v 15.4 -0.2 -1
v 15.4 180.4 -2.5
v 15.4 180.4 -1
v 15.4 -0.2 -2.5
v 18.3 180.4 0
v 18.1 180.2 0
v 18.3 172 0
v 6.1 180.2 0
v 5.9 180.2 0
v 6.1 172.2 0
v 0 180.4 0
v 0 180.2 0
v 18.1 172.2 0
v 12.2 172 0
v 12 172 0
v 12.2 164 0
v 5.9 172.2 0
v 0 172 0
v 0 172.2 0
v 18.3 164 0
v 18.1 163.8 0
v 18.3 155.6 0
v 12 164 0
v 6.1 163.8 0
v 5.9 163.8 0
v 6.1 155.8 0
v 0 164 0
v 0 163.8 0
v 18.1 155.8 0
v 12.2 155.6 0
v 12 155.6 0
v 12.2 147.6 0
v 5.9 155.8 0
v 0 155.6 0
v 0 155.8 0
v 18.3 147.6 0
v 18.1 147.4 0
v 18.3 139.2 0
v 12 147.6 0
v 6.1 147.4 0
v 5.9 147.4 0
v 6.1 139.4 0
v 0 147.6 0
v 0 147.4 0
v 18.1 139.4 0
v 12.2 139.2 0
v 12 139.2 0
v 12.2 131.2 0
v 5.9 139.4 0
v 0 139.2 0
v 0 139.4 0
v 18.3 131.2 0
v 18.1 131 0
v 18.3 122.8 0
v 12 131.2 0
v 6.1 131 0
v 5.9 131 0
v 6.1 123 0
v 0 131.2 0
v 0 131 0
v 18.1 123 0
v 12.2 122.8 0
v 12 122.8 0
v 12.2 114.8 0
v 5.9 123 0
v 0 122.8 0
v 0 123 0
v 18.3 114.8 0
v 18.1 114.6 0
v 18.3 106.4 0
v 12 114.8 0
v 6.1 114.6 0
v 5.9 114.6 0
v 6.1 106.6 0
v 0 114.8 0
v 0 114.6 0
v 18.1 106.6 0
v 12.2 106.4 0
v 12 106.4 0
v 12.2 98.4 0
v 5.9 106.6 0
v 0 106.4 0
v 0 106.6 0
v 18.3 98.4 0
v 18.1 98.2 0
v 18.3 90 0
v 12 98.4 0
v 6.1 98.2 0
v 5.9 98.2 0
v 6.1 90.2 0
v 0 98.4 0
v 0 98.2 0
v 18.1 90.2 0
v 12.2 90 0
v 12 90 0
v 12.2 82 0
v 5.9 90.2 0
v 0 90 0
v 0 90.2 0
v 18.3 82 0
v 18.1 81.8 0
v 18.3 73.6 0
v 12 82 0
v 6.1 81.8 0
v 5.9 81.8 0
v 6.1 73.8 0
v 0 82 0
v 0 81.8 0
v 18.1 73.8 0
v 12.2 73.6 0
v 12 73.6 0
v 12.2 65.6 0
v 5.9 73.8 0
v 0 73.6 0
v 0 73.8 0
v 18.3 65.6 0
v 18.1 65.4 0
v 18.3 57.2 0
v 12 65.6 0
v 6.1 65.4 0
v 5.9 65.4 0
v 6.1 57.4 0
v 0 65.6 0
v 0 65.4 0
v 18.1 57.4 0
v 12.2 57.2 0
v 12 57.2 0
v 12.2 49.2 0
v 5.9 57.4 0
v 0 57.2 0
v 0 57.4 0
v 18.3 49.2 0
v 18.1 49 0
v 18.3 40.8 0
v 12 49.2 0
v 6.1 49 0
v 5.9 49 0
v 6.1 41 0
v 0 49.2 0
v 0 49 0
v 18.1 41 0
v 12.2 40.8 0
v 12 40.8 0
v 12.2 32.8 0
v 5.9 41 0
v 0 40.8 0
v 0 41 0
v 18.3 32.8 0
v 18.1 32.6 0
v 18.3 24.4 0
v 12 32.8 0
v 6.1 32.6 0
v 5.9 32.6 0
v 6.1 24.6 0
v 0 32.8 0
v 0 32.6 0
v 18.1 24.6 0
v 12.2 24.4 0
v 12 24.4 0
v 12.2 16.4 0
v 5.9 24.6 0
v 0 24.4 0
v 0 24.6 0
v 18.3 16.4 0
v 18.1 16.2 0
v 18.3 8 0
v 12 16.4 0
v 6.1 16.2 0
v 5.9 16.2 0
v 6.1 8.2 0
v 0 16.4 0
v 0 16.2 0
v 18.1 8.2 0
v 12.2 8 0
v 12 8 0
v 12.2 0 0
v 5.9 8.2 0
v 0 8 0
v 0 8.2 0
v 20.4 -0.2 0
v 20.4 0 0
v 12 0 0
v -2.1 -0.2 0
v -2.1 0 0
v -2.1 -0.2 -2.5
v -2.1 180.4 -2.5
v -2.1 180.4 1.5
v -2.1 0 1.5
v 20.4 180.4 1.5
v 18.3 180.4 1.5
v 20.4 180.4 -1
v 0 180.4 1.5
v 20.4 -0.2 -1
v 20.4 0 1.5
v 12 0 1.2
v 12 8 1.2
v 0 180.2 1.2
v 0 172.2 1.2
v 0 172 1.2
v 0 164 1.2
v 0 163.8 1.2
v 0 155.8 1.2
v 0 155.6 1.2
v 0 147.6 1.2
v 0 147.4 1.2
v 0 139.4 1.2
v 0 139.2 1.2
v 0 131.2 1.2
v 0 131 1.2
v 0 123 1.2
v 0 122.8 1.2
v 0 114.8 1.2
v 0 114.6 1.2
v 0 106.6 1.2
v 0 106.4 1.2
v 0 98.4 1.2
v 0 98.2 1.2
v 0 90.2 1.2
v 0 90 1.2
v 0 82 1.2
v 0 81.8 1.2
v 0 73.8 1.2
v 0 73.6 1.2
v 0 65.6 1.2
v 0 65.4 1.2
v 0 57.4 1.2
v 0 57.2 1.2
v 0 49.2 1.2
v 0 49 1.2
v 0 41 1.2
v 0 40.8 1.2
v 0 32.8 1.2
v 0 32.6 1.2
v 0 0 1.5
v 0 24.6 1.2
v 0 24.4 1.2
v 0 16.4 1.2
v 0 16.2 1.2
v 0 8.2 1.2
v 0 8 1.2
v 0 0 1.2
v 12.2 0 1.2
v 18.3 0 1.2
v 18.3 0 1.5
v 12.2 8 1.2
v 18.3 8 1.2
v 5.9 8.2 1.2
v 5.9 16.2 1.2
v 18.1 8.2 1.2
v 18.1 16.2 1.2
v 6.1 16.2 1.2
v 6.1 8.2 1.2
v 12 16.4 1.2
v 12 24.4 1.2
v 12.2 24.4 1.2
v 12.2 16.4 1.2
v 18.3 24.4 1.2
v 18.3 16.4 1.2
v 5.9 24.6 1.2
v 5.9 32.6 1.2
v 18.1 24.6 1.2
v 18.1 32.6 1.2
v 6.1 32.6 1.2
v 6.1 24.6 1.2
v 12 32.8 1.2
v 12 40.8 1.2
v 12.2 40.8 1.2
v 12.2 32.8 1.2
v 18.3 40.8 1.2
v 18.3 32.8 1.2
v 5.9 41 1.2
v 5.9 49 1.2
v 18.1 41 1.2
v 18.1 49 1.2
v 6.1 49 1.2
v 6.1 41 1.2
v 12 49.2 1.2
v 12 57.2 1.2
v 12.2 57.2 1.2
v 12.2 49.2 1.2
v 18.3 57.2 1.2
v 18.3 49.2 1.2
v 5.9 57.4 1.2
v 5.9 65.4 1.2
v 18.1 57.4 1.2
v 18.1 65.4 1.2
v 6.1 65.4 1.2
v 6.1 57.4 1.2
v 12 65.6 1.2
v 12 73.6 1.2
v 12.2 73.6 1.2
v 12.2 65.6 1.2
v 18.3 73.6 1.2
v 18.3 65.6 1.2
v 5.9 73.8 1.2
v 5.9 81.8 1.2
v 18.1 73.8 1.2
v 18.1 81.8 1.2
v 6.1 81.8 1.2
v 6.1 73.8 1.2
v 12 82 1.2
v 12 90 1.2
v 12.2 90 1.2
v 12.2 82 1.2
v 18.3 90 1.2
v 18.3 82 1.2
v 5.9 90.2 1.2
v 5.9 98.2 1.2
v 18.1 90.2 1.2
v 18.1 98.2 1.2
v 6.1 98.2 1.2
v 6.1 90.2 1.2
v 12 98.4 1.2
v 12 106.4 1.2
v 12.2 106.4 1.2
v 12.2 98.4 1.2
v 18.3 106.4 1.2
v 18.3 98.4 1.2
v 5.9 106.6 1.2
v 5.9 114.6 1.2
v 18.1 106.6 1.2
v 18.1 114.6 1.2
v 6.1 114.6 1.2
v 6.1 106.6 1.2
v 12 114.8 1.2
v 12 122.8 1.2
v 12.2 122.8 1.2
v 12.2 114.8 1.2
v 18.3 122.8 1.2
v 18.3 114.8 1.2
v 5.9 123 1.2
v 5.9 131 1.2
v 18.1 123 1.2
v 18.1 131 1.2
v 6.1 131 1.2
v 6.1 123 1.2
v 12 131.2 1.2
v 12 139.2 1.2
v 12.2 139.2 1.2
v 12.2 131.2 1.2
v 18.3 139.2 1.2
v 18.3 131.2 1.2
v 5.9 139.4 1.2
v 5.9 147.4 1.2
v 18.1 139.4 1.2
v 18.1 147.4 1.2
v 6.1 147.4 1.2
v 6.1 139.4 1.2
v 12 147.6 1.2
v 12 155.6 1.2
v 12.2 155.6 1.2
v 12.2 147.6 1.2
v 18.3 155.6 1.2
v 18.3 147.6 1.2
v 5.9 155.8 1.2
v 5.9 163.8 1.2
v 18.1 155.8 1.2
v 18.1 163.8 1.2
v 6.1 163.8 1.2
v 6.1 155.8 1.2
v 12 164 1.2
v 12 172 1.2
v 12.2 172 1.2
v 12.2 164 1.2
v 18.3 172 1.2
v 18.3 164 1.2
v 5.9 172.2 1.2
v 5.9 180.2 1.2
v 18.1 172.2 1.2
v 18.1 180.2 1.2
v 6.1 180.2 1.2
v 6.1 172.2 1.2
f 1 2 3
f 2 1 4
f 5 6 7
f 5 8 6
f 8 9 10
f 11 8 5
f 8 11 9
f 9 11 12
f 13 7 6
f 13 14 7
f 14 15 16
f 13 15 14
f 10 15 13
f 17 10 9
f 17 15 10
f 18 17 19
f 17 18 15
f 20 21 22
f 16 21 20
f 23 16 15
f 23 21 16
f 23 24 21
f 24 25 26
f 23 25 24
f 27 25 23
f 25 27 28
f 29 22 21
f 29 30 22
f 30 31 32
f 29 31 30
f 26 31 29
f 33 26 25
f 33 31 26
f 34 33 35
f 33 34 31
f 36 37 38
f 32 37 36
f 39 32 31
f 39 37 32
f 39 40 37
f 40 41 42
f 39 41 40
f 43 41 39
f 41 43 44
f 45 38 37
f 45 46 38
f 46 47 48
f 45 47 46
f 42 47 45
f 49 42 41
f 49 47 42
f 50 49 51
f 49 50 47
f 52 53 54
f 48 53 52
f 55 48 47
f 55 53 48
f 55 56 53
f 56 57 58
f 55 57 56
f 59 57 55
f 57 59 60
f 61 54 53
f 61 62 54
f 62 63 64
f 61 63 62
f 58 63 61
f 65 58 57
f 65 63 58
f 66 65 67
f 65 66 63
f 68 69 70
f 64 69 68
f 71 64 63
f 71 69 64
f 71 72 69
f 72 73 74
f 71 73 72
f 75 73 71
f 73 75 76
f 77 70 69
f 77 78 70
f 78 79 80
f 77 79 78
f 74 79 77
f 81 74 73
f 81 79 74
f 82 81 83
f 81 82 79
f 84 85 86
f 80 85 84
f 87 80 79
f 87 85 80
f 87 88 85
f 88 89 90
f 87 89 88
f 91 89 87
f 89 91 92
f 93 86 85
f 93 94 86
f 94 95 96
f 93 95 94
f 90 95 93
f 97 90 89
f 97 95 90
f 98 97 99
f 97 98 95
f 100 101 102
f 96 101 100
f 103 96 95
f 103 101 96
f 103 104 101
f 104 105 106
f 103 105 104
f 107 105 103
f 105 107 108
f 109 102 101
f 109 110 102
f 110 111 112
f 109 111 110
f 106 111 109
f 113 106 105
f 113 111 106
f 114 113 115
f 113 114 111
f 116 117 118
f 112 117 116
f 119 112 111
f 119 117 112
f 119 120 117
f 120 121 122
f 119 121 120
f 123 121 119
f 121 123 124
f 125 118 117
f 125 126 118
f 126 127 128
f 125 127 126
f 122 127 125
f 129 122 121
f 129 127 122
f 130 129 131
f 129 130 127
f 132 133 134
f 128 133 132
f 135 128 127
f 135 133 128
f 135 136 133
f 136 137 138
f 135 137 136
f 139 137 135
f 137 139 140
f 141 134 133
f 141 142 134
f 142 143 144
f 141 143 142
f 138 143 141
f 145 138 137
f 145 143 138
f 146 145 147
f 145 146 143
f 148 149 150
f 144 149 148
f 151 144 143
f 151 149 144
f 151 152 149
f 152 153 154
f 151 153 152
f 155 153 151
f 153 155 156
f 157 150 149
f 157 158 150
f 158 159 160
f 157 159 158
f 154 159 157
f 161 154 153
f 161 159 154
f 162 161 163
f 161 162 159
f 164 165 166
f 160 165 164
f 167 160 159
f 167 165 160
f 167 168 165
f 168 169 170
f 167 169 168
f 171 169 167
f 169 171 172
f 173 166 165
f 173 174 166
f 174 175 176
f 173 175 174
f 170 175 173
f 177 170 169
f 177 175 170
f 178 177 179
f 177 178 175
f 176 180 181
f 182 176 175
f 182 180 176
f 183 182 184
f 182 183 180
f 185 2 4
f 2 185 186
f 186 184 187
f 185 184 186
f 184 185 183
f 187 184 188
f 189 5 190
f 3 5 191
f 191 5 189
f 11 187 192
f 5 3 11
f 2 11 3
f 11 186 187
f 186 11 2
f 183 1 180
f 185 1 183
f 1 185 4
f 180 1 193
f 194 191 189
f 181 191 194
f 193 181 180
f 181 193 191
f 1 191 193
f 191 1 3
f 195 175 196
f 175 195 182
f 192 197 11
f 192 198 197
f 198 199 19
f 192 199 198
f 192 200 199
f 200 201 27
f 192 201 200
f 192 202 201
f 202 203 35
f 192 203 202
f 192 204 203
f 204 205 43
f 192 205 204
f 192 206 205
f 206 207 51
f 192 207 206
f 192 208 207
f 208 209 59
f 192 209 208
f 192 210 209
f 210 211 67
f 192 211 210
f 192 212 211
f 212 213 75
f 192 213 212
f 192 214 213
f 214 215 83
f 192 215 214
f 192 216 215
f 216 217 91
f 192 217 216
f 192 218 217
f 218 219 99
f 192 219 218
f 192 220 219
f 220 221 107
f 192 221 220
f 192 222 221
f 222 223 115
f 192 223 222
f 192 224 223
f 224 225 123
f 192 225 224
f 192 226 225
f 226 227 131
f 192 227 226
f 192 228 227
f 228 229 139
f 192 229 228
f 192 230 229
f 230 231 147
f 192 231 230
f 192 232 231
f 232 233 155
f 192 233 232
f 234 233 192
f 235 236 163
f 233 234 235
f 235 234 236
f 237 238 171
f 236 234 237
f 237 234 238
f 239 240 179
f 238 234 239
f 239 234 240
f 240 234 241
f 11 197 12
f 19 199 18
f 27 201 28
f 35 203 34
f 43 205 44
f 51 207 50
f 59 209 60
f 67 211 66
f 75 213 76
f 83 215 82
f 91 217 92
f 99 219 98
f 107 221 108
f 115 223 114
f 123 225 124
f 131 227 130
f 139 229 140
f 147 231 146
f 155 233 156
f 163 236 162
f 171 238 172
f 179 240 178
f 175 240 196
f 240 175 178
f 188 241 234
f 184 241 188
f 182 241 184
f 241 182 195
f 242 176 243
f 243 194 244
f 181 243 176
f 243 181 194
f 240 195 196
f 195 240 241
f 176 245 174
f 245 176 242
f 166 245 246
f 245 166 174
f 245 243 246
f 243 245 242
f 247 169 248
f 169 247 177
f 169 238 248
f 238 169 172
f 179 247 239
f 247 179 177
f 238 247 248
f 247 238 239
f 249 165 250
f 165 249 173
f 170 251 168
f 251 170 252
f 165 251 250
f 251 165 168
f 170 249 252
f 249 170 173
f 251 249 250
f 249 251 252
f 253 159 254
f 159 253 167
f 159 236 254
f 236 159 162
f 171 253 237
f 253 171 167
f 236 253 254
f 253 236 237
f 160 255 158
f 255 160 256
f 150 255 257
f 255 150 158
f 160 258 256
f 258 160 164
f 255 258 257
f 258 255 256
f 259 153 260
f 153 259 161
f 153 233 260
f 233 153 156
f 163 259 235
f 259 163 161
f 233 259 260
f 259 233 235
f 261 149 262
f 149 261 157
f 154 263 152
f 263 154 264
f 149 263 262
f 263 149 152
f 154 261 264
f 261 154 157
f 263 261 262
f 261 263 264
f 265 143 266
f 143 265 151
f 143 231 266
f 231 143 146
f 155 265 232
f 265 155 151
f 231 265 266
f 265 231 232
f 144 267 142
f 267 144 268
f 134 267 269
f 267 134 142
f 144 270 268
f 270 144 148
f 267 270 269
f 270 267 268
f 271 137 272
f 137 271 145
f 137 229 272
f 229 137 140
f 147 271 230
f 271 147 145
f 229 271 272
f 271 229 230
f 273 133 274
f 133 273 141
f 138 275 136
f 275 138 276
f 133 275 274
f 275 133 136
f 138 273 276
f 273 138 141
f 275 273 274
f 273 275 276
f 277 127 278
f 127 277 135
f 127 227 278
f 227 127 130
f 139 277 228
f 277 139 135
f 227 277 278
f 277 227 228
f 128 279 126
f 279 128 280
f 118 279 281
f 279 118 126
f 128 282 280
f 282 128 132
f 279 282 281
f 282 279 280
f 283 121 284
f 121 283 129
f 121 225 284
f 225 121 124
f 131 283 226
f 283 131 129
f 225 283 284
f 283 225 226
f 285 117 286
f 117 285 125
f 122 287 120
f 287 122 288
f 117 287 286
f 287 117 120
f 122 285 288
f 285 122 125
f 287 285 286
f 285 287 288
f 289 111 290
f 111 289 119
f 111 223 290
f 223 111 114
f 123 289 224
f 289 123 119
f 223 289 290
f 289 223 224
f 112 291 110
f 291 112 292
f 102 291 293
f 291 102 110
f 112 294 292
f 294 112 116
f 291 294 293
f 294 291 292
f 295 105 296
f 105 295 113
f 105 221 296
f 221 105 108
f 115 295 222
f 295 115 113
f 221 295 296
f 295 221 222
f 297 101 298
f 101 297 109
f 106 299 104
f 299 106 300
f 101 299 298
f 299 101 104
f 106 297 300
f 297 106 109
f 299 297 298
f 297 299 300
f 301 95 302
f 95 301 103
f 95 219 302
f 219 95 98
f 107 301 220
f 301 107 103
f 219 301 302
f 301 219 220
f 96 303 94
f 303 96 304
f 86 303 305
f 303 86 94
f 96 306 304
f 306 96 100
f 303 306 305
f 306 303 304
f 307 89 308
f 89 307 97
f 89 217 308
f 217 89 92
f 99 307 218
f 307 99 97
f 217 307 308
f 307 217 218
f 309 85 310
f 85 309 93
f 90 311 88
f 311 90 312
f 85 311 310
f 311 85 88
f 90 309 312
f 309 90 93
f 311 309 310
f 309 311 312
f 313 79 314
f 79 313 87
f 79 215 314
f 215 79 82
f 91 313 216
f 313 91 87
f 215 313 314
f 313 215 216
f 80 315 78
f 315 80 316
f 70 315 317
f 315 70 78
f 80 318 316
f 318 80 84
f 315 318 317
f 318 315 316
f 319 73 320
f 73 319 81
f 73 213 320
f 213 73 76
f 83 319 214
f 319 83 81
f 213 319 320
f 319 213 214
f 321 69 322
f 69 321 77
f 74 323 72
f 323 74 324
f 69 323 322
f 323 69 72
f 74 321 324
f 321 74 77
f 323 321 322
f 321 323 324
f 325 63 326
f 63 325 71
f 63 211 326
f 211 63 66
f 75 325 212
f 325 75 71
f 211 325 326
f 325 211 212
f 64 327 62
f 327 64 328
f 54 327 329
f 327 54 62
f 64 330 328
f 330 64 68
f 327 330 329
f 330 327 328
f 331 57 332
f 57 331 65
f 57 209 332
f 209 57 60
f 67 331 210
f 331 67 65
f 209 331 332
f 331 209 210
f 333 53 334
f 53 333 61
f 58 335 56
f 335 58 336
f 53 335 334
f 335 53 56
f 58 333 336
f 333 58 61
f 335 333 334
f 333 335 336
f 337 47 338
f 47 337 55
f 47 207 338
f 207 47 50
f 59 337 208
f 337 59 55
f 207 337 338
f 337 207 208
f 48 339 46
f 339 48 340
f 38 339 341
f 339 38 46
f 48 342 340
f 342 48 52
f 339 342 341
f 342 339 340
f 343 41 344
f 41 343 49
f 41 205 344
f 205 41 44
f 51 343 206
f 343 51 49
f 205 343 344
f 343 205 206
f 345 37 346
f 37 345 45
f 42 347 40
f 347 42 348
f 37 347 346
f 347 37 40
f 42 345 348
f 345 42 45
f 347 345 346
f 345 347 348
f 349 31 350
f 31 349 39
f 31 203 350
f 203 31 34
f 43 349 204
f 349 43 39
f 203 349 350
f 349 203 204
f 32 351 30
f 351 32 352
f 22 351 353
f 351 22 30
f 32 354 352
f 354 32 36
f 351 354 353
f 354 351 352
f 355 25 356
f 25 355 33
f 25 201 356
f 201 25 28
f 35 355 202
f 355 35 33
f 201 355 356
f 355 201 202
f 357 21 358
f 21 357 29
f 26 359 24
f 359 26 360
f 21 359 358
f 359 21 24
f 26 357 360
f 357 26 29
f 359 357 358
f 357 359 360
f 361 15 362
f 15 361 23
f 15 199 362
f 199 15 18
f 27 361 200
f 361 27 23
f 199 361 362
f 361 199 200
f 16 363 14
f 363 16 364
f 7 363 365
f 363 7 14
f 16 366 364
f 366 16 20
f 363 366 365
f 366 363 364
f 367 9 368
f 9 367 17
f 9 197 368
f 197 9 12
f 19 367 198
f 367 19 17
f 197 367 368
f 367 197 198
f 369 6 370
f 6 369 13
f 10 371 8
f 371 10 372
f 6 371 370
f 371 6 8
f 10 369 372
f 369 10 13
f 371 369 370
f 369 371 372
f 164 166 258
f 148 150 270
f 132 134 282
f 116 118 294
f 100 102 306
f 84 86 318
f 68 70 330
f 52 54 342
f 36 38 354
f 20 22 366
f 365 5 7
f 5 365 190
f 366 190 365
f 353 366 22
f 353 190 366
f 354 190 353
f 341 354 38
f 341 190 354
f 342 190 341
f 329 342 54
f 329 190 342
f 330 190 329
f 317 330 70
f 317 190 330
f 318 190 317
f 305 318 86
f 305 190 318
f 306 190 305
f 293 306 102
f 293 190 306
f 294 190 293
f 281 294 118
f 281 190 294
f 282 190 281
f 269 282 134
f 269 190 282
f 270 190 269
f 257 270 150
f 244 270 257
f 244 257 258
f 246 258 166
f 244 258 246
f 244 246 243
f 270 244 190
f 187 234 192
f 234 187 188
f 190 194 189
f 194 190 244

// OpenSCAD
// Brick Pavement Pattern - Running Bond V1.0  November2025
// Based on UK Pavements (very loosely!)

// Parameters
brick_length = 12;      // Length of each brick
brick_width = 8;       // Width of each brick
brick_height = 1.5;       // Height/thickness of each brick
mortar_gap = .2;         // Gap between bricks (mortar joint)
path_width = 1.5;         // Number of bricks across the width
path_length = 22;       // Number of brick rows along the length
curb_width = 2.1;         // Width of the curb on each side
substrate_depth = 2.5;   // substrate depth
Rail_Depth = 1.5; // Set above 0 if you want to indent tram or rail tracks (1.5 works for me)

// Brick module with slightly textured surface
module brick() {
    color([0.3, 0.3, 0.3])  // Dark gray color
    difference() {
        cube([brick_length, brick_width, brick_height]);
        // Add subtle chamfer on top edges
        translate([-0.5, -0.5, brick_height - 0.3])
            cube([brick_length + 1, brick_width + 1, 0.5]);
    }
}

// Create the running bond pattern
module running_bond_pattern() {
    total_width = path_width * (brick_length + mortar_gap);
    
    // Use intersection to clip bricks to the path boundaries
    intersection() {
        // Create all bricks (including ones that extend beyond)
        union() {
            for (row = [0 : path_length - 1]) {
                // Alternate between offset and non-offset rows
                offset = (row % 2) * (brick_length / 2 + mortar_gap / 2);
                
                // Calculate how many bricks we need (including partial ones)
                num_bricks = path_width + 2;
                
                for (col = [0 : num_bricks - 1]) {
                    x_pos = col * (brick_length + mortar_gap) - offset;
                    y_pos = row * (brick_width + mortar_gap);
                    
                    translate([x_pos, y_pos, 0])
                        brick();
                }
            }
        }
        
        // Clipping box to trim bricks at edges
        translate([0, 0, -1])
            cube([
                total_width, 
                path_length * (brick_width + mortar_gap) + mortar_gap,
                brick_height + 2
            ]);
    }
}

// Create base/substrate (optional - represents the ground beneath allows for hieght adjustment)
module base() {
    total_width = path_width * (brick_length + mortar_gap);
    
    color([0.6, 0.5, 0.4])  // Sandy/ground color
    translate([-curb_width, -mortar_gap, -substrate_depth])
        cube([
            total_width-5 + (2 * curb_width), 
            path_length * (brick_width + mortar_gap) + mortar_gap,
            substrate_depth   ]);
    translate([-curb_width, -mortar_gap, -substrate_depth+Rail_Depth])
        cube([
            total_width + (2 * curb_width), 
            path_length * (brick_width + mortar_gap) + mortar_gap,
            substrate_depth -Rail_Depth  ]);
    
    
    
}

// Render the complete pavement
base();
running_bond_pattern();

// Add edge curbs
module curb() {
    color([0.4, 0.4, 0.4])
    cube([curb_width, path_length * (brick_width + mortar_gap), brick_height + 1]);
}

total_width = path_width * (brick_length + mortar_gap);

translate([-curb_width, 0, -1])
    curb();
    
translate([total_width, 0, -1])
    curb();
